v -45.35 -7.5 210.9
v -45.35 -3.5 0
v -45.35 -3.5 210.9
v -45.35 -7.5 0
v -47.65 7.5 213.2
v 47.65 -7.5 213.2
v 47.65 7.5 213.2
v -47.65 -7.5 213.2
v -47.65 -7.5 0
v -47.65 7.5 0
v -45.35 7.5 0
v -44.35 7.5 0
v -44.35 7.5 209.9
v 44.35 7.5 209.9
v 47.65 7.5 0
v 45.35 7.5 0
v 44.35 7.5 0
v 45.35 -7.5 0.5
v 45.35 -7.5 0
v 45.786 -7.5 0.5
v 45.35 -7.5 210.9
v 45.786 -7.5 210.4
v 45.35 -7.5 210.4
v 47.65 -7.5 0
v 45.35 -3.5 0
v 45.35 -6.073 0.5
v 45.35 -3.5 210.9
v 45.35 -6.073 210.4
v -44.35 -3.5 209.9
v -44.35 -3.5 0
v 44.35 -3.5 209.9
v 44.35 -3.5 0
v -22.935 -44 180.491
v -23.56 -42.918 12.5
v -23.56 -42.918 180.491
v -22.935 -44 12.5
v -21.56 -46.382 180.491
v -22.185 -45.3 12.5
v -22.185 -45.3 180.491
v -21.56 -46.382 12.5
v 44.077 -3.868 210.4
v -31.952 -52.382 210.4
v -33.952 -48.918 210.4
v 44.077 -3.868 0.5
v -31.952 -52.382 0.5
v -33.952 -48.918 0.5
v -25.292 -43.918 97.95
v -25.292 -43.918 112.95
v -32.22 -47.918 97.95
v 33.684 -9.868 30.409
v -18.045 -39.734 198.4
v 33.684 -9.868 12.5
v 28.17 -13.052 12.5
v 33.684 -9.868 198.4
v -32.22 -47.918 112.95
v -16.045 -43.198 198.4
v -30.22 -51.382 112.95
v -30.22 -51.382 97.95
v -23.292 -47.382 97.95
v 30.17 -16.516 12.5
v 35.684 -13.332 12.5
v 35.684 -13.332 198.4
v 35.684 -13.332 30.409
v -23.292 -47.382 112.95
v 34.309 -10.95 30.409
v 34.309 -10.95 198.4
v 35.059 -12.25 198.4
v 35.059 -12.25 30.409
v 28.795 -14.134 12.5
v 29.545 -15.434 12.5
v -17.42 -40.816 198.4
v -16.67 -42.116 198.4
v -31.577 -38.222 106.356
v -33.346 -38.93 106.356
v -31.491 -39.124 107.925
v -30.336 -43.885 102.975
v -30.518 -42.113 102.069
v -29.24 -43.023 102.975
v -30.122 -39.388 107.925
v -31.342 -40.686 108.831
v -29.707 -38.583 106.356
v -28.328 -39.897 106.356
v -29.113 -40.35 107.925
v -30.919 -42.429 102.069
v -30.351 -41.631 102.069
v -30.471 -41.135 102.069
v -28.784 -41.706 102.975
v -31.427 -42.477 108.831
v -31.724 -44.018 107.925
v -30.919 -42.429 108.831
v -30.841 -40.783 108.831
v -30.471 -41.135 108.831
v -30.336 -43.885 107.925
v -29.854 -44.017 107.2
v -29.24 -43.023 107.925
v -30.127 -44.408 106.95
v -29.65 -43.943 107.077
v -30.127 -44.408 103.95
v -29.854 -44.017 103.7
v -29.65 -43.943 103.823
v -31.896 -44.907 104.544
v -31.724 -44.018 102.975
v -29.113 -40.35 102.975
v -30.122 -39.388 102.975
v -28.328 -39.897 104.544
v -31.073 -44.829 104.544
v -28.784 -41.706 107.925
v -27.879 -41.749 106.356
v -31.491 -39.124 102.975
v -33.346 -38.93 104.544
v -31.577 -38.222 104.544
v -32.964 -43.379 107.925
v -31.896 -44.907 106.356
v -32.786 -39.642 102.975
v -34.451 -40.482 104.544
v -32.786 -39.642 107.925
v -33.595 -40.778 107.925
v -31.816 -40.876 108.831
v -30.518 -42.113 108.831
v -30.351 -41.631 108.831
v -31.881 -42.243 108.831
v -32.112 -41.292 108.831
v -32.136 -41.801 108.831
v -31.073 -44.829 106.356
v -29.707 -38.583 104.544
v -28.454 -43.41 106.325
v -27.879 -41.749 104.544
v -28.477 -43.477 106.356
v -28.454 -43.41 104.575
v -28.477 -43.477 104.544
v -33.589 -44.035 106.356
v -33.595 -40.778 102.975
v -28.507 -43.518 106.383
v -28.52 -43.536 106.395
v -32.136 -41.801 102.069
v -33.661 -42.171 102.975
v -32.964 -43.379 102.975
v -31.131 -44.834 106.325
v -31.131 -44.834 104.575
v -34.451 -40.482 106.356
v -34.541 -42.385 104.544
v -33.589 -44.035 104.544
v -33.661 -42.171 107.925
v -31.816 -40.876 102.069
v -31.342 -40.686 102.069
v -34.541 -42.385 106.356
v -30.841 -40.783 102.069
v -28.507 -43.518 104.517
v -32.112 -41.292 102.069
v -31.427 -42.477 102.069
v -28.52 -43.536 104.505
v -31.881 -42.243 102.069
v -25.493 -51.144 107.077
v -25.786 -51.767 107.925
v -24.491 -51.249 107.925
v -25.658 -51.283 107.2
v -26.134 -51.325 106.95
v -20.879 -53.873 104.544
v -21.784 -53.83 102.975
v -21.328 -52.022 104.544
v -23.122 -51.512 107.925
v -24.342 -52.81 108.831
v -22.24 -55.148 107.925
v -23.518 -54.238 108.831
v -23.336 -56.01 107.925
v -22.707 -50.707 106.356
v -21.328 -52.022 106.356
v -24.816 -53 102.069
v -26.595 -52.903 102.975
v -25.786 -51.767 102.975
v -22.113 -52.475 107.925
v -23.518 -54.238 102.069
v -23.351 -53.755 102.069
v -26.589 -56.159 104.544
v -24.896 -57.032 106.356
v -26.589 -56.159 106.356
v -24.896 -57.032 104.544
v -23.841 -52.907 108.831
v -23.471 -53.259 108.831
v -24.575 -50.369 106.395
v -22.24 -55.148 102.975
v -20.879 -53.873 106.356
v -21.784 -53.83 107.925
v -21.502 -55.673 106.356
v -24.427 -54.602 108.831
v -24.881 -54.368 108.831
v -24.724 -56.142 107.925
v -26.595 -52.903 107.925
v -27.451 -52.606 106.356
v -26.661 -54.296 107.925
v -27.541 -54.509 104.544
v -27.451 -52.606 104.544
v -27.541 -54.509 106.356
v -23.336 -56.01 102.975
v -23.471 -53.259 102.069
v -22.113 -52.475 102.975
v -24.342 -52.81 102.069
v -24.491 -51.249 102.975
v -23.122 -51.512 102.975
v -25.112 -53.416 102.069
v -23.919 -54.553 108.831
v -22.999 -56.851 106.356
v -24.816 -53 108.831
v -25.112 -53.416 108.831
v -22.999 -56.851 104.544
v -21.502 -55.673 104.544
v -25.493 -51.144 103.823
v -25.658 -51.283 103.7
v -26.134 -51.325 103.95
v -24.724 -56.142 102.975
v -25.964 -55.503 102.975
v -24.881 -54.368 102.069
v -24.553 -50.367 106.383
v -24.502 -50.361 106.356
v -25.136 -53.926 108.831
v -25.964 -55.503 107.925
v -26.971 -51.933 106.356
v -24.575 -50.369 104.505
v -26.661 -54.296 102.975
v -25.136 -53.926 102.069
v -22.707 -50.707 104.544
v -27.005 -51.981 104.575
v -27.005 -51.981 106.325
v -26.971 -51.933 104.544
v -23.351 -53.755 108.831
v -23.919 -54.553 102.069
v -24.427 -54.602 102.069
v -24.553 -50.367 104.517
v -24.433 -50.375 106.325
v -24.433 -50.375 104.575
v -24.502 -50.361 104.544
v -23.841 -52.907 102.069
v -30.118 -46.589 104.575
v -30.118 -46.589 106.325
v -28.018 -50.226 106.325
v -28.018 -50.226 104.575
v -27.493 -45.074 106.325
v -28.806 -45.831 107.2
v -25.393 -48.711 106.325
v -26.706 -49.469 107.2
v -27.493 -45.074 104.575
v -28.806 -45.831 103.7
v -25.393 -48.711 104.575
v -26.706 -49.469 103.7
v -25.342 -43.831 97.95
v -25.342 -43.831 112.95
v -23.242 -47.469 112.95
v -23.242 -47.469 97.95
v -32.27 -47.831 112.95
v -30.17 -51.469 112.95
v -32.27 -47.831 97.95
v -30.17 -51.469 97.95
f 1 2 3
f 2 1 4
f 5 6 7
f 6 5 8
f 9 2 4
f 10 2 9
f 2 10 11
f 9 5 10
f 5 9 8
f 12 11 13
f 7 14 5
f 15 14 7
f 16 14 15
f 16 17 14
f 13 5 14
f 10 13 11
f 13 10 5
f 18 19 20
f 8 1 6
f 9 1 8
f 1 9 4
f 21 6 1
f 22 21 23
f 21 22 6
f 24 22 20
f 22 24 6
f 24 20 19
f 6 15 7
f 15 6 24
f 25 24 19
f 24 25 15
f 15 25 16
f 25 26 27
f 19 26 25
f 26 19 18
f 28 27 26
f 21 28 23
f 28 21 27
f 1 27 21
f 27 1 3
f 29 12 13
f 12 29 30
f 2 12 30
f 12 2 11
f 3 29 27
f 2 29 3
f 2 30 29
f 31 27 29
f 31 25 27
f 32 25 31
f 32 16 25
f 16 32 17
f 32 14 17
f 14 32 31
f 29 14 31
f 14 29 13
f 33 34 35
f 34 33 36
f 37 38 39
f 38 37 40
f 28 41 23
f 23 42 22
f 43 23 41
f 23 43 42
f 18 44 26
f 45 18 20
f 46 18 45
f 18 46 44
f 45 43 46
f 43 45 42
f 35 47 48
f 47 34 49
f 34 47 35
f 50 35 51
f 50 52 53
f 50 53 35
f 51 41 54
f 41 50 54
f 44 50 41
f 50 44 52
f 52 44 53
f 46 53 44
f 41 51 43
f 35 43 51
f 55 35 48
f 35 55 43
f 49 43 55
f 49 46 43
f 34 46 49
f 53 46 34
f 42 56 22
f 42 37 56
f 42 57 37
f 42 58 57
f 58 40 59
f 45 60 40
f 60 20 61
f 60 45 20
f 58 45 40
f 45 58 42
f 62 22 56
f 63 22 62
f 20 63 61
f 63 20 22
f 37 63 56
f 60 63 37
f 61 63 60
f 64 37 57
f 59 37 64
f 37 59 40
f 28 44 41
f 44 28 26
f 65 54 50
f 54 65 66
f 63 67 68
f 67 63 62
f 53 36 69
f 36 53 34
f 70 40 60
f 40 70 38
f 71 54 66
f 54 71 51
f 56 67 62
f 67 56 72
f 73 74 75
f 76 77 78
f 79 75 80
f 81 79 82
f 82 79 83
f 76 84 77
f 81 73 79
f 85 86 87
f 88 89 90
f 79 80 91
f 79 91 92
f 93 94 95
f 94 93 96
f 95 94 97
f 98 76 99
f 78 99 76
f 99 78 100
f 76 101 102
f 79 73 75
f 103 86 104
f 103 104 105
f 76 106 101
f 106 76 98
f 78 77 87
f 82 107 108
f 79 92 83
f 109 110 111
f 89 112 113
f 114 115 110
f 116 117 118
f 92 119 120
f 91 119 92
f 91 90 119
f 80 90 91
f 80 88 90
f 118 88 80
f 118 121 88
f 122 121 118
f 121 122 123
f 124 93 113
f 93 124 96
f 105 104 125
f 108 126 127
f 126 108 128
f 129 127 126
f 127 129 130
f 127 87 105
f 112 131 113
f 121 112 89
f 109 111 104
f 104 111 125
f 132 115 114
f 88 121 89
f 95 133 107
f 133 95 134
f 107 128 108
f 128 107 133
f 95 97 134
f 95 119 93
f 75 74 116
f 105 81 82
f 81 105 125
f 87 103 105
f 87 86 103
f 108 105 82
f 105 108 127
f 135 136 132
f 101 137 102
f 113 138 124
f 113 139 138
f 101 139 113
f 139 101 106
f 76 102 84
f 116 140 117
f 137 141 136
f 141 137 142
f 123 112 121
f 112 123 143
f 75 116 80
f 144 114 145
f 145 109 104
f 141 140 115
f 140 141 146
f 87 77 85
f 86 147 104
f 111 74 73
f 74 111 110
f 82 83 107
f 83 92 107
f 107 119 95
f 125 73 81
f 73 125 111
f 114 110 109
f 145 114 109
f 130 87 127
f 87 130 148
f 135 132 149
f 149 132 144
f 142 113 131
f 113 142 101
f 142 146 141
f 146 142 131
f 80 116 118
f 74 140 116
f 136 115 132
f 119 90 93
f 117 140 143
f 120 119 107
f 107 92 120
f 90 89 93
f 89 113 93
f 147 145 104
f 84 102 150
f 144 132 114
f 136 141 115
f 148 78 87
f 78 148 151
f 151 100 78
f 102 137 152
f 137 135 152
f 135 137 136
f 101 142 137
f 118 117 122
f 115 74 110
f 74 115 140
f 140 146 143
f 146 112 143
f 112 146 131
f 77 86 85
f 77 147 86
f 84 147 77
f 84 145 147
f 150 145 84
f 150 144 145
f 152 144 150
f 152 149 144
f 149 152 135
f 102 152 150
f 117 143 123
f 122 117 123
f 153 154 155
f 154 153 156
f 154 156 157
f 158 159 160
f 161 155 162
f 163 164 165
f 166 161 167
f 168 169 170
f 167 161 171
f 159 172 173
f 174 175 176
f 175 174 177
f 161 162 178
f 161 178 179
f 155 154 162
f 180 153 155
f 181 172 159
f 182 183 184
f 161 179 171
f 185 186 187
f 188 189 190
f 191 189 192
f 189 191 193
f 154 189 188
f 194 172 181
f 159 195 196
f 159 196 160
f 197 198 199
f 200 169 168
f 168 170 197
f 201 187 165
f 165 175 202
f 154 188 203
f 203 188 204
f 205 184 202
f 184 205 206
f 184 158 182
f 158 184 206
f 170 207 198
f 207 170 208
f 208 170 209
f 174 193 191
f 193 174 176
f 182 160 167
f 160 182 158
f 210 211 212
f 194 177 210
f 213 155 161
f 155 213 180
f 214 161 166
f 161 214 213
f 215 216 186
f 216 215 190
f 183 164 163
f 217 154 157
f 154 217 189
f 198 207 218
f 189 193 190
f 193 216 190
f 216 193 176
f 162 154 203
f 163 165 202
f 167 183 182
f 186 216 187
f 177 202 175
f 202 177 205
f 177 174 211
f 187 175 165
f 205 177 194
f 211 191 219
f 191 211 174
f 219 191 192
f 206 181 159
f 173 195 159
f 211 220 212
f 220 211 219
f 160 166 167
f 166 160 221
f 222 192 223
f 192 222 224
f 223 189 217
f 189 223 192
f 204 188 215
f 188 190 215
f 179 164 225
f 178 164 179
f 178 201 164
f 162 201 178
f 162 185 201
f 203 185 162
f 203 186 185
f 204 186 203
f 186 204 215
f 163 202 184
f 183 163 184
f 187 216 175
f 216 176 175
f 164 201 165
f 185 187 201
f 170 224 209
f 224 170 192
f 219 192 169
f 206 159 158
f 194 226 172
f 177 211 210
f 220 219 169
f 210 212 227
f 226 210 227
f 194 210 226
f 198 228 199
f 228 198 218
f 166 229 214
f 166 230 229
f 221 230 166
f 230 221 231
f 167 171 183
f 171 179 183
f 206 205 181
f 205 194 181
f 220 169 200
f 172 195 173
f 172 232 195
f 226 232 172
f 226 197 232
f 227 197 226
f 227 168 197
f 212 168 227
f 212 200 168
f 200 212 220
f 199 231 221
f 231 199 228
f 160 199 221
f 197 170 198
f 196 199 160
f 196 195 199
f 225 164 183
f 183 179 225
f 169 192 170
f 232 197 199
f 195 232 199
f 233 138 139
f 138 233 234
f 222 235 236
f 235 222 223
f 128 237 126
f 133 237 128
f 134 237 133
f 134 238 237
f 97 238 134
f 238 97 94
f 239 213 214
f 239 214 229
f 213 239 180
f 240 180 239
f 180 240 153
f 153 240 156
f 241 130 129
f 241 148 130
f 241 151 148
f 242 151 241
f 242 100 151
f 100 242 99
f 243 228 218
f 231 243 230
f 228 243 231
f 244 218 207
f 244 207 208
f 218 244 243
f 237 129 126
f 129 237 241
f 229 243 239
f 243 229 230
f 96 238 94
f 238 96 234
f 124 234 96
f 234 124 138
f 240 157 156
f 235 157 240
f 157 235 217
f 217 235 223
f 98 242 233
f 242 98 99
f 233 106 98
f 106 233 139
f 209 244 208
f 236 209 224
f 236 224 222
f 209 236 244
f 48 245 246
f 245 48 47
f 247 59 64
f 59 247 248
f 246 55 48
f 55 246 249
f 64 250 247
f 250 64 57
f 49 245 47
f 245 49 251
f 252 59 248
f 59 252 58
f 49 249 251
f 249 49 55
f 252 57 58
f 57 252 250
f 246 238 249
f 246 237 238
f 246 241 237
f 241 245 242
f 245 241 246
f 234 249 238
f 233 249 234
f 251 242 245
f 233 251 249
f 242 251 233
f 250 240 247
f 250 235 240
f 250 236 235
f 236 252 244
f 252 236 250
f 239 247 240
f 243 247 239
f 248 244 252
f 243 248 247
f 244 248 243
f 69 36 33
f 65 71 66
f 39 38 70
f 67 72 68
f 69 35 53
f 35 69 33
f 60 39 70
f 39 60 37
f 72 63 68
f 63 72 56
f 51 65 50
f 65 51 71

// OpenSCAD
module basicdoor(width=95.3, height=213.2, wall_thickness=15, right_handed = false, open_angle = 30) 
{
  translate([0,0,height/2])
  {
    profile_width = 12;
    door_thickness = 4.0;
    frame_profile_width = 2.3;
    frame_profile_depth = wall_thickness;
    seal_profile_width = 1.0;
    
    /* Outer frame fixed to convrete wall. */
    color([0.3,0.3,0.3,0.2])
    basicdoorframe(false, width, height, frame_profile_width, frame_profile_depth);

    color([0.4,0.4,0.4,0.2])
    translate([0, door_thickness/2,-frame_profile_width/2])
    basicdoorframe(false, width - 2 * frame_profile_width,
        height - frame_profile_width, 
        seal_profile_width, frame_profile_depth - door_thickness);
    
    /* Calculate door size. */
    open_w = width - 2 * frame_profile_width - 0.6;
    open_h = height - frame_profile_width - 1.0;

    ow = open_w/2 + 0.2;
    translate([right_handed?-ow:ow, 
        -(frame_profile_depth-door_thickness)/2, -frame_profile_width/2])
    rotate([0, 0, right_handed?-open_angle:open_angle])
    translate([right_handed?ow:-ow, 0, 0])
     union() {
        /* Playwood */
        color([0.4,0.4,0.4,0.2])
        cube([open_w, 1.5, open_h], center=true);
        
        /* Door strengtehing. */
        color([0.5,0.5,0.5,0.2])
        basicdoorframe(true, open_w, open_h, profile_width, door_thickness);
        
         /* Diagonal strengthening */
        dx = open_w - 2*profile_width;
        dy = open_h - 2*profile_width;
        l = sqrt(dx*dx+dy*dy);
        rotate([0,-atan2(dx,dy), 0])
        color([0.5,0.5,0.5,0.2])
        cube([profile_width, door_thickness, l], center=true);
         
         /* Door knob */
         translate([right_handed ? open_w/2 - 6.0 : -open_w/2 + 6.0, 0, 0])
         color([218/255,172/255,96/255,0.5])
         doorknob(door_thickness);
    }
  }
}

module basicdoorframe(draw_bottom=true,width=70, height=110, profile_width = 5, door_thickness = 8) 
{
    translate([-(width - profile_width)/2, 0, 0]) 
    cube([profile_width,door_thickness, height], center=true);
    
    translate([(width - profile_width)/2, 0, 0]) 
    cube([profile_width,door_thickness, height], center=true);

    if (draw_bottom) {
        translate([0, 0, -(height - profile_width)/2]) 
        cube([width, door_thickness, profile_width], center=true);
    }
    
    translate([0, 0, (height - profile_width)/2]) 
    cube([width, door_thickness, profile_width], center=true);
}    

module doorknob(door_thickness = 8)
{
    doorknob_length = 7;
    doorknob_r = 3.5;
    
    translate([0, doorknob_length, 0]) 
    sphere(r=doorknob_r);
    translate([0, -doorknob_length, 0]) 
    sphere(r=doorknob_r);
 
    rotate([90, 90, 0])
    cylinder(h = doorknob_length*2, r = 0.5 * doorknob_r, center=true);
   
    cube([8, door_thickness+0.2, 15],center=true); 
}

// For testing
basicdoor();
